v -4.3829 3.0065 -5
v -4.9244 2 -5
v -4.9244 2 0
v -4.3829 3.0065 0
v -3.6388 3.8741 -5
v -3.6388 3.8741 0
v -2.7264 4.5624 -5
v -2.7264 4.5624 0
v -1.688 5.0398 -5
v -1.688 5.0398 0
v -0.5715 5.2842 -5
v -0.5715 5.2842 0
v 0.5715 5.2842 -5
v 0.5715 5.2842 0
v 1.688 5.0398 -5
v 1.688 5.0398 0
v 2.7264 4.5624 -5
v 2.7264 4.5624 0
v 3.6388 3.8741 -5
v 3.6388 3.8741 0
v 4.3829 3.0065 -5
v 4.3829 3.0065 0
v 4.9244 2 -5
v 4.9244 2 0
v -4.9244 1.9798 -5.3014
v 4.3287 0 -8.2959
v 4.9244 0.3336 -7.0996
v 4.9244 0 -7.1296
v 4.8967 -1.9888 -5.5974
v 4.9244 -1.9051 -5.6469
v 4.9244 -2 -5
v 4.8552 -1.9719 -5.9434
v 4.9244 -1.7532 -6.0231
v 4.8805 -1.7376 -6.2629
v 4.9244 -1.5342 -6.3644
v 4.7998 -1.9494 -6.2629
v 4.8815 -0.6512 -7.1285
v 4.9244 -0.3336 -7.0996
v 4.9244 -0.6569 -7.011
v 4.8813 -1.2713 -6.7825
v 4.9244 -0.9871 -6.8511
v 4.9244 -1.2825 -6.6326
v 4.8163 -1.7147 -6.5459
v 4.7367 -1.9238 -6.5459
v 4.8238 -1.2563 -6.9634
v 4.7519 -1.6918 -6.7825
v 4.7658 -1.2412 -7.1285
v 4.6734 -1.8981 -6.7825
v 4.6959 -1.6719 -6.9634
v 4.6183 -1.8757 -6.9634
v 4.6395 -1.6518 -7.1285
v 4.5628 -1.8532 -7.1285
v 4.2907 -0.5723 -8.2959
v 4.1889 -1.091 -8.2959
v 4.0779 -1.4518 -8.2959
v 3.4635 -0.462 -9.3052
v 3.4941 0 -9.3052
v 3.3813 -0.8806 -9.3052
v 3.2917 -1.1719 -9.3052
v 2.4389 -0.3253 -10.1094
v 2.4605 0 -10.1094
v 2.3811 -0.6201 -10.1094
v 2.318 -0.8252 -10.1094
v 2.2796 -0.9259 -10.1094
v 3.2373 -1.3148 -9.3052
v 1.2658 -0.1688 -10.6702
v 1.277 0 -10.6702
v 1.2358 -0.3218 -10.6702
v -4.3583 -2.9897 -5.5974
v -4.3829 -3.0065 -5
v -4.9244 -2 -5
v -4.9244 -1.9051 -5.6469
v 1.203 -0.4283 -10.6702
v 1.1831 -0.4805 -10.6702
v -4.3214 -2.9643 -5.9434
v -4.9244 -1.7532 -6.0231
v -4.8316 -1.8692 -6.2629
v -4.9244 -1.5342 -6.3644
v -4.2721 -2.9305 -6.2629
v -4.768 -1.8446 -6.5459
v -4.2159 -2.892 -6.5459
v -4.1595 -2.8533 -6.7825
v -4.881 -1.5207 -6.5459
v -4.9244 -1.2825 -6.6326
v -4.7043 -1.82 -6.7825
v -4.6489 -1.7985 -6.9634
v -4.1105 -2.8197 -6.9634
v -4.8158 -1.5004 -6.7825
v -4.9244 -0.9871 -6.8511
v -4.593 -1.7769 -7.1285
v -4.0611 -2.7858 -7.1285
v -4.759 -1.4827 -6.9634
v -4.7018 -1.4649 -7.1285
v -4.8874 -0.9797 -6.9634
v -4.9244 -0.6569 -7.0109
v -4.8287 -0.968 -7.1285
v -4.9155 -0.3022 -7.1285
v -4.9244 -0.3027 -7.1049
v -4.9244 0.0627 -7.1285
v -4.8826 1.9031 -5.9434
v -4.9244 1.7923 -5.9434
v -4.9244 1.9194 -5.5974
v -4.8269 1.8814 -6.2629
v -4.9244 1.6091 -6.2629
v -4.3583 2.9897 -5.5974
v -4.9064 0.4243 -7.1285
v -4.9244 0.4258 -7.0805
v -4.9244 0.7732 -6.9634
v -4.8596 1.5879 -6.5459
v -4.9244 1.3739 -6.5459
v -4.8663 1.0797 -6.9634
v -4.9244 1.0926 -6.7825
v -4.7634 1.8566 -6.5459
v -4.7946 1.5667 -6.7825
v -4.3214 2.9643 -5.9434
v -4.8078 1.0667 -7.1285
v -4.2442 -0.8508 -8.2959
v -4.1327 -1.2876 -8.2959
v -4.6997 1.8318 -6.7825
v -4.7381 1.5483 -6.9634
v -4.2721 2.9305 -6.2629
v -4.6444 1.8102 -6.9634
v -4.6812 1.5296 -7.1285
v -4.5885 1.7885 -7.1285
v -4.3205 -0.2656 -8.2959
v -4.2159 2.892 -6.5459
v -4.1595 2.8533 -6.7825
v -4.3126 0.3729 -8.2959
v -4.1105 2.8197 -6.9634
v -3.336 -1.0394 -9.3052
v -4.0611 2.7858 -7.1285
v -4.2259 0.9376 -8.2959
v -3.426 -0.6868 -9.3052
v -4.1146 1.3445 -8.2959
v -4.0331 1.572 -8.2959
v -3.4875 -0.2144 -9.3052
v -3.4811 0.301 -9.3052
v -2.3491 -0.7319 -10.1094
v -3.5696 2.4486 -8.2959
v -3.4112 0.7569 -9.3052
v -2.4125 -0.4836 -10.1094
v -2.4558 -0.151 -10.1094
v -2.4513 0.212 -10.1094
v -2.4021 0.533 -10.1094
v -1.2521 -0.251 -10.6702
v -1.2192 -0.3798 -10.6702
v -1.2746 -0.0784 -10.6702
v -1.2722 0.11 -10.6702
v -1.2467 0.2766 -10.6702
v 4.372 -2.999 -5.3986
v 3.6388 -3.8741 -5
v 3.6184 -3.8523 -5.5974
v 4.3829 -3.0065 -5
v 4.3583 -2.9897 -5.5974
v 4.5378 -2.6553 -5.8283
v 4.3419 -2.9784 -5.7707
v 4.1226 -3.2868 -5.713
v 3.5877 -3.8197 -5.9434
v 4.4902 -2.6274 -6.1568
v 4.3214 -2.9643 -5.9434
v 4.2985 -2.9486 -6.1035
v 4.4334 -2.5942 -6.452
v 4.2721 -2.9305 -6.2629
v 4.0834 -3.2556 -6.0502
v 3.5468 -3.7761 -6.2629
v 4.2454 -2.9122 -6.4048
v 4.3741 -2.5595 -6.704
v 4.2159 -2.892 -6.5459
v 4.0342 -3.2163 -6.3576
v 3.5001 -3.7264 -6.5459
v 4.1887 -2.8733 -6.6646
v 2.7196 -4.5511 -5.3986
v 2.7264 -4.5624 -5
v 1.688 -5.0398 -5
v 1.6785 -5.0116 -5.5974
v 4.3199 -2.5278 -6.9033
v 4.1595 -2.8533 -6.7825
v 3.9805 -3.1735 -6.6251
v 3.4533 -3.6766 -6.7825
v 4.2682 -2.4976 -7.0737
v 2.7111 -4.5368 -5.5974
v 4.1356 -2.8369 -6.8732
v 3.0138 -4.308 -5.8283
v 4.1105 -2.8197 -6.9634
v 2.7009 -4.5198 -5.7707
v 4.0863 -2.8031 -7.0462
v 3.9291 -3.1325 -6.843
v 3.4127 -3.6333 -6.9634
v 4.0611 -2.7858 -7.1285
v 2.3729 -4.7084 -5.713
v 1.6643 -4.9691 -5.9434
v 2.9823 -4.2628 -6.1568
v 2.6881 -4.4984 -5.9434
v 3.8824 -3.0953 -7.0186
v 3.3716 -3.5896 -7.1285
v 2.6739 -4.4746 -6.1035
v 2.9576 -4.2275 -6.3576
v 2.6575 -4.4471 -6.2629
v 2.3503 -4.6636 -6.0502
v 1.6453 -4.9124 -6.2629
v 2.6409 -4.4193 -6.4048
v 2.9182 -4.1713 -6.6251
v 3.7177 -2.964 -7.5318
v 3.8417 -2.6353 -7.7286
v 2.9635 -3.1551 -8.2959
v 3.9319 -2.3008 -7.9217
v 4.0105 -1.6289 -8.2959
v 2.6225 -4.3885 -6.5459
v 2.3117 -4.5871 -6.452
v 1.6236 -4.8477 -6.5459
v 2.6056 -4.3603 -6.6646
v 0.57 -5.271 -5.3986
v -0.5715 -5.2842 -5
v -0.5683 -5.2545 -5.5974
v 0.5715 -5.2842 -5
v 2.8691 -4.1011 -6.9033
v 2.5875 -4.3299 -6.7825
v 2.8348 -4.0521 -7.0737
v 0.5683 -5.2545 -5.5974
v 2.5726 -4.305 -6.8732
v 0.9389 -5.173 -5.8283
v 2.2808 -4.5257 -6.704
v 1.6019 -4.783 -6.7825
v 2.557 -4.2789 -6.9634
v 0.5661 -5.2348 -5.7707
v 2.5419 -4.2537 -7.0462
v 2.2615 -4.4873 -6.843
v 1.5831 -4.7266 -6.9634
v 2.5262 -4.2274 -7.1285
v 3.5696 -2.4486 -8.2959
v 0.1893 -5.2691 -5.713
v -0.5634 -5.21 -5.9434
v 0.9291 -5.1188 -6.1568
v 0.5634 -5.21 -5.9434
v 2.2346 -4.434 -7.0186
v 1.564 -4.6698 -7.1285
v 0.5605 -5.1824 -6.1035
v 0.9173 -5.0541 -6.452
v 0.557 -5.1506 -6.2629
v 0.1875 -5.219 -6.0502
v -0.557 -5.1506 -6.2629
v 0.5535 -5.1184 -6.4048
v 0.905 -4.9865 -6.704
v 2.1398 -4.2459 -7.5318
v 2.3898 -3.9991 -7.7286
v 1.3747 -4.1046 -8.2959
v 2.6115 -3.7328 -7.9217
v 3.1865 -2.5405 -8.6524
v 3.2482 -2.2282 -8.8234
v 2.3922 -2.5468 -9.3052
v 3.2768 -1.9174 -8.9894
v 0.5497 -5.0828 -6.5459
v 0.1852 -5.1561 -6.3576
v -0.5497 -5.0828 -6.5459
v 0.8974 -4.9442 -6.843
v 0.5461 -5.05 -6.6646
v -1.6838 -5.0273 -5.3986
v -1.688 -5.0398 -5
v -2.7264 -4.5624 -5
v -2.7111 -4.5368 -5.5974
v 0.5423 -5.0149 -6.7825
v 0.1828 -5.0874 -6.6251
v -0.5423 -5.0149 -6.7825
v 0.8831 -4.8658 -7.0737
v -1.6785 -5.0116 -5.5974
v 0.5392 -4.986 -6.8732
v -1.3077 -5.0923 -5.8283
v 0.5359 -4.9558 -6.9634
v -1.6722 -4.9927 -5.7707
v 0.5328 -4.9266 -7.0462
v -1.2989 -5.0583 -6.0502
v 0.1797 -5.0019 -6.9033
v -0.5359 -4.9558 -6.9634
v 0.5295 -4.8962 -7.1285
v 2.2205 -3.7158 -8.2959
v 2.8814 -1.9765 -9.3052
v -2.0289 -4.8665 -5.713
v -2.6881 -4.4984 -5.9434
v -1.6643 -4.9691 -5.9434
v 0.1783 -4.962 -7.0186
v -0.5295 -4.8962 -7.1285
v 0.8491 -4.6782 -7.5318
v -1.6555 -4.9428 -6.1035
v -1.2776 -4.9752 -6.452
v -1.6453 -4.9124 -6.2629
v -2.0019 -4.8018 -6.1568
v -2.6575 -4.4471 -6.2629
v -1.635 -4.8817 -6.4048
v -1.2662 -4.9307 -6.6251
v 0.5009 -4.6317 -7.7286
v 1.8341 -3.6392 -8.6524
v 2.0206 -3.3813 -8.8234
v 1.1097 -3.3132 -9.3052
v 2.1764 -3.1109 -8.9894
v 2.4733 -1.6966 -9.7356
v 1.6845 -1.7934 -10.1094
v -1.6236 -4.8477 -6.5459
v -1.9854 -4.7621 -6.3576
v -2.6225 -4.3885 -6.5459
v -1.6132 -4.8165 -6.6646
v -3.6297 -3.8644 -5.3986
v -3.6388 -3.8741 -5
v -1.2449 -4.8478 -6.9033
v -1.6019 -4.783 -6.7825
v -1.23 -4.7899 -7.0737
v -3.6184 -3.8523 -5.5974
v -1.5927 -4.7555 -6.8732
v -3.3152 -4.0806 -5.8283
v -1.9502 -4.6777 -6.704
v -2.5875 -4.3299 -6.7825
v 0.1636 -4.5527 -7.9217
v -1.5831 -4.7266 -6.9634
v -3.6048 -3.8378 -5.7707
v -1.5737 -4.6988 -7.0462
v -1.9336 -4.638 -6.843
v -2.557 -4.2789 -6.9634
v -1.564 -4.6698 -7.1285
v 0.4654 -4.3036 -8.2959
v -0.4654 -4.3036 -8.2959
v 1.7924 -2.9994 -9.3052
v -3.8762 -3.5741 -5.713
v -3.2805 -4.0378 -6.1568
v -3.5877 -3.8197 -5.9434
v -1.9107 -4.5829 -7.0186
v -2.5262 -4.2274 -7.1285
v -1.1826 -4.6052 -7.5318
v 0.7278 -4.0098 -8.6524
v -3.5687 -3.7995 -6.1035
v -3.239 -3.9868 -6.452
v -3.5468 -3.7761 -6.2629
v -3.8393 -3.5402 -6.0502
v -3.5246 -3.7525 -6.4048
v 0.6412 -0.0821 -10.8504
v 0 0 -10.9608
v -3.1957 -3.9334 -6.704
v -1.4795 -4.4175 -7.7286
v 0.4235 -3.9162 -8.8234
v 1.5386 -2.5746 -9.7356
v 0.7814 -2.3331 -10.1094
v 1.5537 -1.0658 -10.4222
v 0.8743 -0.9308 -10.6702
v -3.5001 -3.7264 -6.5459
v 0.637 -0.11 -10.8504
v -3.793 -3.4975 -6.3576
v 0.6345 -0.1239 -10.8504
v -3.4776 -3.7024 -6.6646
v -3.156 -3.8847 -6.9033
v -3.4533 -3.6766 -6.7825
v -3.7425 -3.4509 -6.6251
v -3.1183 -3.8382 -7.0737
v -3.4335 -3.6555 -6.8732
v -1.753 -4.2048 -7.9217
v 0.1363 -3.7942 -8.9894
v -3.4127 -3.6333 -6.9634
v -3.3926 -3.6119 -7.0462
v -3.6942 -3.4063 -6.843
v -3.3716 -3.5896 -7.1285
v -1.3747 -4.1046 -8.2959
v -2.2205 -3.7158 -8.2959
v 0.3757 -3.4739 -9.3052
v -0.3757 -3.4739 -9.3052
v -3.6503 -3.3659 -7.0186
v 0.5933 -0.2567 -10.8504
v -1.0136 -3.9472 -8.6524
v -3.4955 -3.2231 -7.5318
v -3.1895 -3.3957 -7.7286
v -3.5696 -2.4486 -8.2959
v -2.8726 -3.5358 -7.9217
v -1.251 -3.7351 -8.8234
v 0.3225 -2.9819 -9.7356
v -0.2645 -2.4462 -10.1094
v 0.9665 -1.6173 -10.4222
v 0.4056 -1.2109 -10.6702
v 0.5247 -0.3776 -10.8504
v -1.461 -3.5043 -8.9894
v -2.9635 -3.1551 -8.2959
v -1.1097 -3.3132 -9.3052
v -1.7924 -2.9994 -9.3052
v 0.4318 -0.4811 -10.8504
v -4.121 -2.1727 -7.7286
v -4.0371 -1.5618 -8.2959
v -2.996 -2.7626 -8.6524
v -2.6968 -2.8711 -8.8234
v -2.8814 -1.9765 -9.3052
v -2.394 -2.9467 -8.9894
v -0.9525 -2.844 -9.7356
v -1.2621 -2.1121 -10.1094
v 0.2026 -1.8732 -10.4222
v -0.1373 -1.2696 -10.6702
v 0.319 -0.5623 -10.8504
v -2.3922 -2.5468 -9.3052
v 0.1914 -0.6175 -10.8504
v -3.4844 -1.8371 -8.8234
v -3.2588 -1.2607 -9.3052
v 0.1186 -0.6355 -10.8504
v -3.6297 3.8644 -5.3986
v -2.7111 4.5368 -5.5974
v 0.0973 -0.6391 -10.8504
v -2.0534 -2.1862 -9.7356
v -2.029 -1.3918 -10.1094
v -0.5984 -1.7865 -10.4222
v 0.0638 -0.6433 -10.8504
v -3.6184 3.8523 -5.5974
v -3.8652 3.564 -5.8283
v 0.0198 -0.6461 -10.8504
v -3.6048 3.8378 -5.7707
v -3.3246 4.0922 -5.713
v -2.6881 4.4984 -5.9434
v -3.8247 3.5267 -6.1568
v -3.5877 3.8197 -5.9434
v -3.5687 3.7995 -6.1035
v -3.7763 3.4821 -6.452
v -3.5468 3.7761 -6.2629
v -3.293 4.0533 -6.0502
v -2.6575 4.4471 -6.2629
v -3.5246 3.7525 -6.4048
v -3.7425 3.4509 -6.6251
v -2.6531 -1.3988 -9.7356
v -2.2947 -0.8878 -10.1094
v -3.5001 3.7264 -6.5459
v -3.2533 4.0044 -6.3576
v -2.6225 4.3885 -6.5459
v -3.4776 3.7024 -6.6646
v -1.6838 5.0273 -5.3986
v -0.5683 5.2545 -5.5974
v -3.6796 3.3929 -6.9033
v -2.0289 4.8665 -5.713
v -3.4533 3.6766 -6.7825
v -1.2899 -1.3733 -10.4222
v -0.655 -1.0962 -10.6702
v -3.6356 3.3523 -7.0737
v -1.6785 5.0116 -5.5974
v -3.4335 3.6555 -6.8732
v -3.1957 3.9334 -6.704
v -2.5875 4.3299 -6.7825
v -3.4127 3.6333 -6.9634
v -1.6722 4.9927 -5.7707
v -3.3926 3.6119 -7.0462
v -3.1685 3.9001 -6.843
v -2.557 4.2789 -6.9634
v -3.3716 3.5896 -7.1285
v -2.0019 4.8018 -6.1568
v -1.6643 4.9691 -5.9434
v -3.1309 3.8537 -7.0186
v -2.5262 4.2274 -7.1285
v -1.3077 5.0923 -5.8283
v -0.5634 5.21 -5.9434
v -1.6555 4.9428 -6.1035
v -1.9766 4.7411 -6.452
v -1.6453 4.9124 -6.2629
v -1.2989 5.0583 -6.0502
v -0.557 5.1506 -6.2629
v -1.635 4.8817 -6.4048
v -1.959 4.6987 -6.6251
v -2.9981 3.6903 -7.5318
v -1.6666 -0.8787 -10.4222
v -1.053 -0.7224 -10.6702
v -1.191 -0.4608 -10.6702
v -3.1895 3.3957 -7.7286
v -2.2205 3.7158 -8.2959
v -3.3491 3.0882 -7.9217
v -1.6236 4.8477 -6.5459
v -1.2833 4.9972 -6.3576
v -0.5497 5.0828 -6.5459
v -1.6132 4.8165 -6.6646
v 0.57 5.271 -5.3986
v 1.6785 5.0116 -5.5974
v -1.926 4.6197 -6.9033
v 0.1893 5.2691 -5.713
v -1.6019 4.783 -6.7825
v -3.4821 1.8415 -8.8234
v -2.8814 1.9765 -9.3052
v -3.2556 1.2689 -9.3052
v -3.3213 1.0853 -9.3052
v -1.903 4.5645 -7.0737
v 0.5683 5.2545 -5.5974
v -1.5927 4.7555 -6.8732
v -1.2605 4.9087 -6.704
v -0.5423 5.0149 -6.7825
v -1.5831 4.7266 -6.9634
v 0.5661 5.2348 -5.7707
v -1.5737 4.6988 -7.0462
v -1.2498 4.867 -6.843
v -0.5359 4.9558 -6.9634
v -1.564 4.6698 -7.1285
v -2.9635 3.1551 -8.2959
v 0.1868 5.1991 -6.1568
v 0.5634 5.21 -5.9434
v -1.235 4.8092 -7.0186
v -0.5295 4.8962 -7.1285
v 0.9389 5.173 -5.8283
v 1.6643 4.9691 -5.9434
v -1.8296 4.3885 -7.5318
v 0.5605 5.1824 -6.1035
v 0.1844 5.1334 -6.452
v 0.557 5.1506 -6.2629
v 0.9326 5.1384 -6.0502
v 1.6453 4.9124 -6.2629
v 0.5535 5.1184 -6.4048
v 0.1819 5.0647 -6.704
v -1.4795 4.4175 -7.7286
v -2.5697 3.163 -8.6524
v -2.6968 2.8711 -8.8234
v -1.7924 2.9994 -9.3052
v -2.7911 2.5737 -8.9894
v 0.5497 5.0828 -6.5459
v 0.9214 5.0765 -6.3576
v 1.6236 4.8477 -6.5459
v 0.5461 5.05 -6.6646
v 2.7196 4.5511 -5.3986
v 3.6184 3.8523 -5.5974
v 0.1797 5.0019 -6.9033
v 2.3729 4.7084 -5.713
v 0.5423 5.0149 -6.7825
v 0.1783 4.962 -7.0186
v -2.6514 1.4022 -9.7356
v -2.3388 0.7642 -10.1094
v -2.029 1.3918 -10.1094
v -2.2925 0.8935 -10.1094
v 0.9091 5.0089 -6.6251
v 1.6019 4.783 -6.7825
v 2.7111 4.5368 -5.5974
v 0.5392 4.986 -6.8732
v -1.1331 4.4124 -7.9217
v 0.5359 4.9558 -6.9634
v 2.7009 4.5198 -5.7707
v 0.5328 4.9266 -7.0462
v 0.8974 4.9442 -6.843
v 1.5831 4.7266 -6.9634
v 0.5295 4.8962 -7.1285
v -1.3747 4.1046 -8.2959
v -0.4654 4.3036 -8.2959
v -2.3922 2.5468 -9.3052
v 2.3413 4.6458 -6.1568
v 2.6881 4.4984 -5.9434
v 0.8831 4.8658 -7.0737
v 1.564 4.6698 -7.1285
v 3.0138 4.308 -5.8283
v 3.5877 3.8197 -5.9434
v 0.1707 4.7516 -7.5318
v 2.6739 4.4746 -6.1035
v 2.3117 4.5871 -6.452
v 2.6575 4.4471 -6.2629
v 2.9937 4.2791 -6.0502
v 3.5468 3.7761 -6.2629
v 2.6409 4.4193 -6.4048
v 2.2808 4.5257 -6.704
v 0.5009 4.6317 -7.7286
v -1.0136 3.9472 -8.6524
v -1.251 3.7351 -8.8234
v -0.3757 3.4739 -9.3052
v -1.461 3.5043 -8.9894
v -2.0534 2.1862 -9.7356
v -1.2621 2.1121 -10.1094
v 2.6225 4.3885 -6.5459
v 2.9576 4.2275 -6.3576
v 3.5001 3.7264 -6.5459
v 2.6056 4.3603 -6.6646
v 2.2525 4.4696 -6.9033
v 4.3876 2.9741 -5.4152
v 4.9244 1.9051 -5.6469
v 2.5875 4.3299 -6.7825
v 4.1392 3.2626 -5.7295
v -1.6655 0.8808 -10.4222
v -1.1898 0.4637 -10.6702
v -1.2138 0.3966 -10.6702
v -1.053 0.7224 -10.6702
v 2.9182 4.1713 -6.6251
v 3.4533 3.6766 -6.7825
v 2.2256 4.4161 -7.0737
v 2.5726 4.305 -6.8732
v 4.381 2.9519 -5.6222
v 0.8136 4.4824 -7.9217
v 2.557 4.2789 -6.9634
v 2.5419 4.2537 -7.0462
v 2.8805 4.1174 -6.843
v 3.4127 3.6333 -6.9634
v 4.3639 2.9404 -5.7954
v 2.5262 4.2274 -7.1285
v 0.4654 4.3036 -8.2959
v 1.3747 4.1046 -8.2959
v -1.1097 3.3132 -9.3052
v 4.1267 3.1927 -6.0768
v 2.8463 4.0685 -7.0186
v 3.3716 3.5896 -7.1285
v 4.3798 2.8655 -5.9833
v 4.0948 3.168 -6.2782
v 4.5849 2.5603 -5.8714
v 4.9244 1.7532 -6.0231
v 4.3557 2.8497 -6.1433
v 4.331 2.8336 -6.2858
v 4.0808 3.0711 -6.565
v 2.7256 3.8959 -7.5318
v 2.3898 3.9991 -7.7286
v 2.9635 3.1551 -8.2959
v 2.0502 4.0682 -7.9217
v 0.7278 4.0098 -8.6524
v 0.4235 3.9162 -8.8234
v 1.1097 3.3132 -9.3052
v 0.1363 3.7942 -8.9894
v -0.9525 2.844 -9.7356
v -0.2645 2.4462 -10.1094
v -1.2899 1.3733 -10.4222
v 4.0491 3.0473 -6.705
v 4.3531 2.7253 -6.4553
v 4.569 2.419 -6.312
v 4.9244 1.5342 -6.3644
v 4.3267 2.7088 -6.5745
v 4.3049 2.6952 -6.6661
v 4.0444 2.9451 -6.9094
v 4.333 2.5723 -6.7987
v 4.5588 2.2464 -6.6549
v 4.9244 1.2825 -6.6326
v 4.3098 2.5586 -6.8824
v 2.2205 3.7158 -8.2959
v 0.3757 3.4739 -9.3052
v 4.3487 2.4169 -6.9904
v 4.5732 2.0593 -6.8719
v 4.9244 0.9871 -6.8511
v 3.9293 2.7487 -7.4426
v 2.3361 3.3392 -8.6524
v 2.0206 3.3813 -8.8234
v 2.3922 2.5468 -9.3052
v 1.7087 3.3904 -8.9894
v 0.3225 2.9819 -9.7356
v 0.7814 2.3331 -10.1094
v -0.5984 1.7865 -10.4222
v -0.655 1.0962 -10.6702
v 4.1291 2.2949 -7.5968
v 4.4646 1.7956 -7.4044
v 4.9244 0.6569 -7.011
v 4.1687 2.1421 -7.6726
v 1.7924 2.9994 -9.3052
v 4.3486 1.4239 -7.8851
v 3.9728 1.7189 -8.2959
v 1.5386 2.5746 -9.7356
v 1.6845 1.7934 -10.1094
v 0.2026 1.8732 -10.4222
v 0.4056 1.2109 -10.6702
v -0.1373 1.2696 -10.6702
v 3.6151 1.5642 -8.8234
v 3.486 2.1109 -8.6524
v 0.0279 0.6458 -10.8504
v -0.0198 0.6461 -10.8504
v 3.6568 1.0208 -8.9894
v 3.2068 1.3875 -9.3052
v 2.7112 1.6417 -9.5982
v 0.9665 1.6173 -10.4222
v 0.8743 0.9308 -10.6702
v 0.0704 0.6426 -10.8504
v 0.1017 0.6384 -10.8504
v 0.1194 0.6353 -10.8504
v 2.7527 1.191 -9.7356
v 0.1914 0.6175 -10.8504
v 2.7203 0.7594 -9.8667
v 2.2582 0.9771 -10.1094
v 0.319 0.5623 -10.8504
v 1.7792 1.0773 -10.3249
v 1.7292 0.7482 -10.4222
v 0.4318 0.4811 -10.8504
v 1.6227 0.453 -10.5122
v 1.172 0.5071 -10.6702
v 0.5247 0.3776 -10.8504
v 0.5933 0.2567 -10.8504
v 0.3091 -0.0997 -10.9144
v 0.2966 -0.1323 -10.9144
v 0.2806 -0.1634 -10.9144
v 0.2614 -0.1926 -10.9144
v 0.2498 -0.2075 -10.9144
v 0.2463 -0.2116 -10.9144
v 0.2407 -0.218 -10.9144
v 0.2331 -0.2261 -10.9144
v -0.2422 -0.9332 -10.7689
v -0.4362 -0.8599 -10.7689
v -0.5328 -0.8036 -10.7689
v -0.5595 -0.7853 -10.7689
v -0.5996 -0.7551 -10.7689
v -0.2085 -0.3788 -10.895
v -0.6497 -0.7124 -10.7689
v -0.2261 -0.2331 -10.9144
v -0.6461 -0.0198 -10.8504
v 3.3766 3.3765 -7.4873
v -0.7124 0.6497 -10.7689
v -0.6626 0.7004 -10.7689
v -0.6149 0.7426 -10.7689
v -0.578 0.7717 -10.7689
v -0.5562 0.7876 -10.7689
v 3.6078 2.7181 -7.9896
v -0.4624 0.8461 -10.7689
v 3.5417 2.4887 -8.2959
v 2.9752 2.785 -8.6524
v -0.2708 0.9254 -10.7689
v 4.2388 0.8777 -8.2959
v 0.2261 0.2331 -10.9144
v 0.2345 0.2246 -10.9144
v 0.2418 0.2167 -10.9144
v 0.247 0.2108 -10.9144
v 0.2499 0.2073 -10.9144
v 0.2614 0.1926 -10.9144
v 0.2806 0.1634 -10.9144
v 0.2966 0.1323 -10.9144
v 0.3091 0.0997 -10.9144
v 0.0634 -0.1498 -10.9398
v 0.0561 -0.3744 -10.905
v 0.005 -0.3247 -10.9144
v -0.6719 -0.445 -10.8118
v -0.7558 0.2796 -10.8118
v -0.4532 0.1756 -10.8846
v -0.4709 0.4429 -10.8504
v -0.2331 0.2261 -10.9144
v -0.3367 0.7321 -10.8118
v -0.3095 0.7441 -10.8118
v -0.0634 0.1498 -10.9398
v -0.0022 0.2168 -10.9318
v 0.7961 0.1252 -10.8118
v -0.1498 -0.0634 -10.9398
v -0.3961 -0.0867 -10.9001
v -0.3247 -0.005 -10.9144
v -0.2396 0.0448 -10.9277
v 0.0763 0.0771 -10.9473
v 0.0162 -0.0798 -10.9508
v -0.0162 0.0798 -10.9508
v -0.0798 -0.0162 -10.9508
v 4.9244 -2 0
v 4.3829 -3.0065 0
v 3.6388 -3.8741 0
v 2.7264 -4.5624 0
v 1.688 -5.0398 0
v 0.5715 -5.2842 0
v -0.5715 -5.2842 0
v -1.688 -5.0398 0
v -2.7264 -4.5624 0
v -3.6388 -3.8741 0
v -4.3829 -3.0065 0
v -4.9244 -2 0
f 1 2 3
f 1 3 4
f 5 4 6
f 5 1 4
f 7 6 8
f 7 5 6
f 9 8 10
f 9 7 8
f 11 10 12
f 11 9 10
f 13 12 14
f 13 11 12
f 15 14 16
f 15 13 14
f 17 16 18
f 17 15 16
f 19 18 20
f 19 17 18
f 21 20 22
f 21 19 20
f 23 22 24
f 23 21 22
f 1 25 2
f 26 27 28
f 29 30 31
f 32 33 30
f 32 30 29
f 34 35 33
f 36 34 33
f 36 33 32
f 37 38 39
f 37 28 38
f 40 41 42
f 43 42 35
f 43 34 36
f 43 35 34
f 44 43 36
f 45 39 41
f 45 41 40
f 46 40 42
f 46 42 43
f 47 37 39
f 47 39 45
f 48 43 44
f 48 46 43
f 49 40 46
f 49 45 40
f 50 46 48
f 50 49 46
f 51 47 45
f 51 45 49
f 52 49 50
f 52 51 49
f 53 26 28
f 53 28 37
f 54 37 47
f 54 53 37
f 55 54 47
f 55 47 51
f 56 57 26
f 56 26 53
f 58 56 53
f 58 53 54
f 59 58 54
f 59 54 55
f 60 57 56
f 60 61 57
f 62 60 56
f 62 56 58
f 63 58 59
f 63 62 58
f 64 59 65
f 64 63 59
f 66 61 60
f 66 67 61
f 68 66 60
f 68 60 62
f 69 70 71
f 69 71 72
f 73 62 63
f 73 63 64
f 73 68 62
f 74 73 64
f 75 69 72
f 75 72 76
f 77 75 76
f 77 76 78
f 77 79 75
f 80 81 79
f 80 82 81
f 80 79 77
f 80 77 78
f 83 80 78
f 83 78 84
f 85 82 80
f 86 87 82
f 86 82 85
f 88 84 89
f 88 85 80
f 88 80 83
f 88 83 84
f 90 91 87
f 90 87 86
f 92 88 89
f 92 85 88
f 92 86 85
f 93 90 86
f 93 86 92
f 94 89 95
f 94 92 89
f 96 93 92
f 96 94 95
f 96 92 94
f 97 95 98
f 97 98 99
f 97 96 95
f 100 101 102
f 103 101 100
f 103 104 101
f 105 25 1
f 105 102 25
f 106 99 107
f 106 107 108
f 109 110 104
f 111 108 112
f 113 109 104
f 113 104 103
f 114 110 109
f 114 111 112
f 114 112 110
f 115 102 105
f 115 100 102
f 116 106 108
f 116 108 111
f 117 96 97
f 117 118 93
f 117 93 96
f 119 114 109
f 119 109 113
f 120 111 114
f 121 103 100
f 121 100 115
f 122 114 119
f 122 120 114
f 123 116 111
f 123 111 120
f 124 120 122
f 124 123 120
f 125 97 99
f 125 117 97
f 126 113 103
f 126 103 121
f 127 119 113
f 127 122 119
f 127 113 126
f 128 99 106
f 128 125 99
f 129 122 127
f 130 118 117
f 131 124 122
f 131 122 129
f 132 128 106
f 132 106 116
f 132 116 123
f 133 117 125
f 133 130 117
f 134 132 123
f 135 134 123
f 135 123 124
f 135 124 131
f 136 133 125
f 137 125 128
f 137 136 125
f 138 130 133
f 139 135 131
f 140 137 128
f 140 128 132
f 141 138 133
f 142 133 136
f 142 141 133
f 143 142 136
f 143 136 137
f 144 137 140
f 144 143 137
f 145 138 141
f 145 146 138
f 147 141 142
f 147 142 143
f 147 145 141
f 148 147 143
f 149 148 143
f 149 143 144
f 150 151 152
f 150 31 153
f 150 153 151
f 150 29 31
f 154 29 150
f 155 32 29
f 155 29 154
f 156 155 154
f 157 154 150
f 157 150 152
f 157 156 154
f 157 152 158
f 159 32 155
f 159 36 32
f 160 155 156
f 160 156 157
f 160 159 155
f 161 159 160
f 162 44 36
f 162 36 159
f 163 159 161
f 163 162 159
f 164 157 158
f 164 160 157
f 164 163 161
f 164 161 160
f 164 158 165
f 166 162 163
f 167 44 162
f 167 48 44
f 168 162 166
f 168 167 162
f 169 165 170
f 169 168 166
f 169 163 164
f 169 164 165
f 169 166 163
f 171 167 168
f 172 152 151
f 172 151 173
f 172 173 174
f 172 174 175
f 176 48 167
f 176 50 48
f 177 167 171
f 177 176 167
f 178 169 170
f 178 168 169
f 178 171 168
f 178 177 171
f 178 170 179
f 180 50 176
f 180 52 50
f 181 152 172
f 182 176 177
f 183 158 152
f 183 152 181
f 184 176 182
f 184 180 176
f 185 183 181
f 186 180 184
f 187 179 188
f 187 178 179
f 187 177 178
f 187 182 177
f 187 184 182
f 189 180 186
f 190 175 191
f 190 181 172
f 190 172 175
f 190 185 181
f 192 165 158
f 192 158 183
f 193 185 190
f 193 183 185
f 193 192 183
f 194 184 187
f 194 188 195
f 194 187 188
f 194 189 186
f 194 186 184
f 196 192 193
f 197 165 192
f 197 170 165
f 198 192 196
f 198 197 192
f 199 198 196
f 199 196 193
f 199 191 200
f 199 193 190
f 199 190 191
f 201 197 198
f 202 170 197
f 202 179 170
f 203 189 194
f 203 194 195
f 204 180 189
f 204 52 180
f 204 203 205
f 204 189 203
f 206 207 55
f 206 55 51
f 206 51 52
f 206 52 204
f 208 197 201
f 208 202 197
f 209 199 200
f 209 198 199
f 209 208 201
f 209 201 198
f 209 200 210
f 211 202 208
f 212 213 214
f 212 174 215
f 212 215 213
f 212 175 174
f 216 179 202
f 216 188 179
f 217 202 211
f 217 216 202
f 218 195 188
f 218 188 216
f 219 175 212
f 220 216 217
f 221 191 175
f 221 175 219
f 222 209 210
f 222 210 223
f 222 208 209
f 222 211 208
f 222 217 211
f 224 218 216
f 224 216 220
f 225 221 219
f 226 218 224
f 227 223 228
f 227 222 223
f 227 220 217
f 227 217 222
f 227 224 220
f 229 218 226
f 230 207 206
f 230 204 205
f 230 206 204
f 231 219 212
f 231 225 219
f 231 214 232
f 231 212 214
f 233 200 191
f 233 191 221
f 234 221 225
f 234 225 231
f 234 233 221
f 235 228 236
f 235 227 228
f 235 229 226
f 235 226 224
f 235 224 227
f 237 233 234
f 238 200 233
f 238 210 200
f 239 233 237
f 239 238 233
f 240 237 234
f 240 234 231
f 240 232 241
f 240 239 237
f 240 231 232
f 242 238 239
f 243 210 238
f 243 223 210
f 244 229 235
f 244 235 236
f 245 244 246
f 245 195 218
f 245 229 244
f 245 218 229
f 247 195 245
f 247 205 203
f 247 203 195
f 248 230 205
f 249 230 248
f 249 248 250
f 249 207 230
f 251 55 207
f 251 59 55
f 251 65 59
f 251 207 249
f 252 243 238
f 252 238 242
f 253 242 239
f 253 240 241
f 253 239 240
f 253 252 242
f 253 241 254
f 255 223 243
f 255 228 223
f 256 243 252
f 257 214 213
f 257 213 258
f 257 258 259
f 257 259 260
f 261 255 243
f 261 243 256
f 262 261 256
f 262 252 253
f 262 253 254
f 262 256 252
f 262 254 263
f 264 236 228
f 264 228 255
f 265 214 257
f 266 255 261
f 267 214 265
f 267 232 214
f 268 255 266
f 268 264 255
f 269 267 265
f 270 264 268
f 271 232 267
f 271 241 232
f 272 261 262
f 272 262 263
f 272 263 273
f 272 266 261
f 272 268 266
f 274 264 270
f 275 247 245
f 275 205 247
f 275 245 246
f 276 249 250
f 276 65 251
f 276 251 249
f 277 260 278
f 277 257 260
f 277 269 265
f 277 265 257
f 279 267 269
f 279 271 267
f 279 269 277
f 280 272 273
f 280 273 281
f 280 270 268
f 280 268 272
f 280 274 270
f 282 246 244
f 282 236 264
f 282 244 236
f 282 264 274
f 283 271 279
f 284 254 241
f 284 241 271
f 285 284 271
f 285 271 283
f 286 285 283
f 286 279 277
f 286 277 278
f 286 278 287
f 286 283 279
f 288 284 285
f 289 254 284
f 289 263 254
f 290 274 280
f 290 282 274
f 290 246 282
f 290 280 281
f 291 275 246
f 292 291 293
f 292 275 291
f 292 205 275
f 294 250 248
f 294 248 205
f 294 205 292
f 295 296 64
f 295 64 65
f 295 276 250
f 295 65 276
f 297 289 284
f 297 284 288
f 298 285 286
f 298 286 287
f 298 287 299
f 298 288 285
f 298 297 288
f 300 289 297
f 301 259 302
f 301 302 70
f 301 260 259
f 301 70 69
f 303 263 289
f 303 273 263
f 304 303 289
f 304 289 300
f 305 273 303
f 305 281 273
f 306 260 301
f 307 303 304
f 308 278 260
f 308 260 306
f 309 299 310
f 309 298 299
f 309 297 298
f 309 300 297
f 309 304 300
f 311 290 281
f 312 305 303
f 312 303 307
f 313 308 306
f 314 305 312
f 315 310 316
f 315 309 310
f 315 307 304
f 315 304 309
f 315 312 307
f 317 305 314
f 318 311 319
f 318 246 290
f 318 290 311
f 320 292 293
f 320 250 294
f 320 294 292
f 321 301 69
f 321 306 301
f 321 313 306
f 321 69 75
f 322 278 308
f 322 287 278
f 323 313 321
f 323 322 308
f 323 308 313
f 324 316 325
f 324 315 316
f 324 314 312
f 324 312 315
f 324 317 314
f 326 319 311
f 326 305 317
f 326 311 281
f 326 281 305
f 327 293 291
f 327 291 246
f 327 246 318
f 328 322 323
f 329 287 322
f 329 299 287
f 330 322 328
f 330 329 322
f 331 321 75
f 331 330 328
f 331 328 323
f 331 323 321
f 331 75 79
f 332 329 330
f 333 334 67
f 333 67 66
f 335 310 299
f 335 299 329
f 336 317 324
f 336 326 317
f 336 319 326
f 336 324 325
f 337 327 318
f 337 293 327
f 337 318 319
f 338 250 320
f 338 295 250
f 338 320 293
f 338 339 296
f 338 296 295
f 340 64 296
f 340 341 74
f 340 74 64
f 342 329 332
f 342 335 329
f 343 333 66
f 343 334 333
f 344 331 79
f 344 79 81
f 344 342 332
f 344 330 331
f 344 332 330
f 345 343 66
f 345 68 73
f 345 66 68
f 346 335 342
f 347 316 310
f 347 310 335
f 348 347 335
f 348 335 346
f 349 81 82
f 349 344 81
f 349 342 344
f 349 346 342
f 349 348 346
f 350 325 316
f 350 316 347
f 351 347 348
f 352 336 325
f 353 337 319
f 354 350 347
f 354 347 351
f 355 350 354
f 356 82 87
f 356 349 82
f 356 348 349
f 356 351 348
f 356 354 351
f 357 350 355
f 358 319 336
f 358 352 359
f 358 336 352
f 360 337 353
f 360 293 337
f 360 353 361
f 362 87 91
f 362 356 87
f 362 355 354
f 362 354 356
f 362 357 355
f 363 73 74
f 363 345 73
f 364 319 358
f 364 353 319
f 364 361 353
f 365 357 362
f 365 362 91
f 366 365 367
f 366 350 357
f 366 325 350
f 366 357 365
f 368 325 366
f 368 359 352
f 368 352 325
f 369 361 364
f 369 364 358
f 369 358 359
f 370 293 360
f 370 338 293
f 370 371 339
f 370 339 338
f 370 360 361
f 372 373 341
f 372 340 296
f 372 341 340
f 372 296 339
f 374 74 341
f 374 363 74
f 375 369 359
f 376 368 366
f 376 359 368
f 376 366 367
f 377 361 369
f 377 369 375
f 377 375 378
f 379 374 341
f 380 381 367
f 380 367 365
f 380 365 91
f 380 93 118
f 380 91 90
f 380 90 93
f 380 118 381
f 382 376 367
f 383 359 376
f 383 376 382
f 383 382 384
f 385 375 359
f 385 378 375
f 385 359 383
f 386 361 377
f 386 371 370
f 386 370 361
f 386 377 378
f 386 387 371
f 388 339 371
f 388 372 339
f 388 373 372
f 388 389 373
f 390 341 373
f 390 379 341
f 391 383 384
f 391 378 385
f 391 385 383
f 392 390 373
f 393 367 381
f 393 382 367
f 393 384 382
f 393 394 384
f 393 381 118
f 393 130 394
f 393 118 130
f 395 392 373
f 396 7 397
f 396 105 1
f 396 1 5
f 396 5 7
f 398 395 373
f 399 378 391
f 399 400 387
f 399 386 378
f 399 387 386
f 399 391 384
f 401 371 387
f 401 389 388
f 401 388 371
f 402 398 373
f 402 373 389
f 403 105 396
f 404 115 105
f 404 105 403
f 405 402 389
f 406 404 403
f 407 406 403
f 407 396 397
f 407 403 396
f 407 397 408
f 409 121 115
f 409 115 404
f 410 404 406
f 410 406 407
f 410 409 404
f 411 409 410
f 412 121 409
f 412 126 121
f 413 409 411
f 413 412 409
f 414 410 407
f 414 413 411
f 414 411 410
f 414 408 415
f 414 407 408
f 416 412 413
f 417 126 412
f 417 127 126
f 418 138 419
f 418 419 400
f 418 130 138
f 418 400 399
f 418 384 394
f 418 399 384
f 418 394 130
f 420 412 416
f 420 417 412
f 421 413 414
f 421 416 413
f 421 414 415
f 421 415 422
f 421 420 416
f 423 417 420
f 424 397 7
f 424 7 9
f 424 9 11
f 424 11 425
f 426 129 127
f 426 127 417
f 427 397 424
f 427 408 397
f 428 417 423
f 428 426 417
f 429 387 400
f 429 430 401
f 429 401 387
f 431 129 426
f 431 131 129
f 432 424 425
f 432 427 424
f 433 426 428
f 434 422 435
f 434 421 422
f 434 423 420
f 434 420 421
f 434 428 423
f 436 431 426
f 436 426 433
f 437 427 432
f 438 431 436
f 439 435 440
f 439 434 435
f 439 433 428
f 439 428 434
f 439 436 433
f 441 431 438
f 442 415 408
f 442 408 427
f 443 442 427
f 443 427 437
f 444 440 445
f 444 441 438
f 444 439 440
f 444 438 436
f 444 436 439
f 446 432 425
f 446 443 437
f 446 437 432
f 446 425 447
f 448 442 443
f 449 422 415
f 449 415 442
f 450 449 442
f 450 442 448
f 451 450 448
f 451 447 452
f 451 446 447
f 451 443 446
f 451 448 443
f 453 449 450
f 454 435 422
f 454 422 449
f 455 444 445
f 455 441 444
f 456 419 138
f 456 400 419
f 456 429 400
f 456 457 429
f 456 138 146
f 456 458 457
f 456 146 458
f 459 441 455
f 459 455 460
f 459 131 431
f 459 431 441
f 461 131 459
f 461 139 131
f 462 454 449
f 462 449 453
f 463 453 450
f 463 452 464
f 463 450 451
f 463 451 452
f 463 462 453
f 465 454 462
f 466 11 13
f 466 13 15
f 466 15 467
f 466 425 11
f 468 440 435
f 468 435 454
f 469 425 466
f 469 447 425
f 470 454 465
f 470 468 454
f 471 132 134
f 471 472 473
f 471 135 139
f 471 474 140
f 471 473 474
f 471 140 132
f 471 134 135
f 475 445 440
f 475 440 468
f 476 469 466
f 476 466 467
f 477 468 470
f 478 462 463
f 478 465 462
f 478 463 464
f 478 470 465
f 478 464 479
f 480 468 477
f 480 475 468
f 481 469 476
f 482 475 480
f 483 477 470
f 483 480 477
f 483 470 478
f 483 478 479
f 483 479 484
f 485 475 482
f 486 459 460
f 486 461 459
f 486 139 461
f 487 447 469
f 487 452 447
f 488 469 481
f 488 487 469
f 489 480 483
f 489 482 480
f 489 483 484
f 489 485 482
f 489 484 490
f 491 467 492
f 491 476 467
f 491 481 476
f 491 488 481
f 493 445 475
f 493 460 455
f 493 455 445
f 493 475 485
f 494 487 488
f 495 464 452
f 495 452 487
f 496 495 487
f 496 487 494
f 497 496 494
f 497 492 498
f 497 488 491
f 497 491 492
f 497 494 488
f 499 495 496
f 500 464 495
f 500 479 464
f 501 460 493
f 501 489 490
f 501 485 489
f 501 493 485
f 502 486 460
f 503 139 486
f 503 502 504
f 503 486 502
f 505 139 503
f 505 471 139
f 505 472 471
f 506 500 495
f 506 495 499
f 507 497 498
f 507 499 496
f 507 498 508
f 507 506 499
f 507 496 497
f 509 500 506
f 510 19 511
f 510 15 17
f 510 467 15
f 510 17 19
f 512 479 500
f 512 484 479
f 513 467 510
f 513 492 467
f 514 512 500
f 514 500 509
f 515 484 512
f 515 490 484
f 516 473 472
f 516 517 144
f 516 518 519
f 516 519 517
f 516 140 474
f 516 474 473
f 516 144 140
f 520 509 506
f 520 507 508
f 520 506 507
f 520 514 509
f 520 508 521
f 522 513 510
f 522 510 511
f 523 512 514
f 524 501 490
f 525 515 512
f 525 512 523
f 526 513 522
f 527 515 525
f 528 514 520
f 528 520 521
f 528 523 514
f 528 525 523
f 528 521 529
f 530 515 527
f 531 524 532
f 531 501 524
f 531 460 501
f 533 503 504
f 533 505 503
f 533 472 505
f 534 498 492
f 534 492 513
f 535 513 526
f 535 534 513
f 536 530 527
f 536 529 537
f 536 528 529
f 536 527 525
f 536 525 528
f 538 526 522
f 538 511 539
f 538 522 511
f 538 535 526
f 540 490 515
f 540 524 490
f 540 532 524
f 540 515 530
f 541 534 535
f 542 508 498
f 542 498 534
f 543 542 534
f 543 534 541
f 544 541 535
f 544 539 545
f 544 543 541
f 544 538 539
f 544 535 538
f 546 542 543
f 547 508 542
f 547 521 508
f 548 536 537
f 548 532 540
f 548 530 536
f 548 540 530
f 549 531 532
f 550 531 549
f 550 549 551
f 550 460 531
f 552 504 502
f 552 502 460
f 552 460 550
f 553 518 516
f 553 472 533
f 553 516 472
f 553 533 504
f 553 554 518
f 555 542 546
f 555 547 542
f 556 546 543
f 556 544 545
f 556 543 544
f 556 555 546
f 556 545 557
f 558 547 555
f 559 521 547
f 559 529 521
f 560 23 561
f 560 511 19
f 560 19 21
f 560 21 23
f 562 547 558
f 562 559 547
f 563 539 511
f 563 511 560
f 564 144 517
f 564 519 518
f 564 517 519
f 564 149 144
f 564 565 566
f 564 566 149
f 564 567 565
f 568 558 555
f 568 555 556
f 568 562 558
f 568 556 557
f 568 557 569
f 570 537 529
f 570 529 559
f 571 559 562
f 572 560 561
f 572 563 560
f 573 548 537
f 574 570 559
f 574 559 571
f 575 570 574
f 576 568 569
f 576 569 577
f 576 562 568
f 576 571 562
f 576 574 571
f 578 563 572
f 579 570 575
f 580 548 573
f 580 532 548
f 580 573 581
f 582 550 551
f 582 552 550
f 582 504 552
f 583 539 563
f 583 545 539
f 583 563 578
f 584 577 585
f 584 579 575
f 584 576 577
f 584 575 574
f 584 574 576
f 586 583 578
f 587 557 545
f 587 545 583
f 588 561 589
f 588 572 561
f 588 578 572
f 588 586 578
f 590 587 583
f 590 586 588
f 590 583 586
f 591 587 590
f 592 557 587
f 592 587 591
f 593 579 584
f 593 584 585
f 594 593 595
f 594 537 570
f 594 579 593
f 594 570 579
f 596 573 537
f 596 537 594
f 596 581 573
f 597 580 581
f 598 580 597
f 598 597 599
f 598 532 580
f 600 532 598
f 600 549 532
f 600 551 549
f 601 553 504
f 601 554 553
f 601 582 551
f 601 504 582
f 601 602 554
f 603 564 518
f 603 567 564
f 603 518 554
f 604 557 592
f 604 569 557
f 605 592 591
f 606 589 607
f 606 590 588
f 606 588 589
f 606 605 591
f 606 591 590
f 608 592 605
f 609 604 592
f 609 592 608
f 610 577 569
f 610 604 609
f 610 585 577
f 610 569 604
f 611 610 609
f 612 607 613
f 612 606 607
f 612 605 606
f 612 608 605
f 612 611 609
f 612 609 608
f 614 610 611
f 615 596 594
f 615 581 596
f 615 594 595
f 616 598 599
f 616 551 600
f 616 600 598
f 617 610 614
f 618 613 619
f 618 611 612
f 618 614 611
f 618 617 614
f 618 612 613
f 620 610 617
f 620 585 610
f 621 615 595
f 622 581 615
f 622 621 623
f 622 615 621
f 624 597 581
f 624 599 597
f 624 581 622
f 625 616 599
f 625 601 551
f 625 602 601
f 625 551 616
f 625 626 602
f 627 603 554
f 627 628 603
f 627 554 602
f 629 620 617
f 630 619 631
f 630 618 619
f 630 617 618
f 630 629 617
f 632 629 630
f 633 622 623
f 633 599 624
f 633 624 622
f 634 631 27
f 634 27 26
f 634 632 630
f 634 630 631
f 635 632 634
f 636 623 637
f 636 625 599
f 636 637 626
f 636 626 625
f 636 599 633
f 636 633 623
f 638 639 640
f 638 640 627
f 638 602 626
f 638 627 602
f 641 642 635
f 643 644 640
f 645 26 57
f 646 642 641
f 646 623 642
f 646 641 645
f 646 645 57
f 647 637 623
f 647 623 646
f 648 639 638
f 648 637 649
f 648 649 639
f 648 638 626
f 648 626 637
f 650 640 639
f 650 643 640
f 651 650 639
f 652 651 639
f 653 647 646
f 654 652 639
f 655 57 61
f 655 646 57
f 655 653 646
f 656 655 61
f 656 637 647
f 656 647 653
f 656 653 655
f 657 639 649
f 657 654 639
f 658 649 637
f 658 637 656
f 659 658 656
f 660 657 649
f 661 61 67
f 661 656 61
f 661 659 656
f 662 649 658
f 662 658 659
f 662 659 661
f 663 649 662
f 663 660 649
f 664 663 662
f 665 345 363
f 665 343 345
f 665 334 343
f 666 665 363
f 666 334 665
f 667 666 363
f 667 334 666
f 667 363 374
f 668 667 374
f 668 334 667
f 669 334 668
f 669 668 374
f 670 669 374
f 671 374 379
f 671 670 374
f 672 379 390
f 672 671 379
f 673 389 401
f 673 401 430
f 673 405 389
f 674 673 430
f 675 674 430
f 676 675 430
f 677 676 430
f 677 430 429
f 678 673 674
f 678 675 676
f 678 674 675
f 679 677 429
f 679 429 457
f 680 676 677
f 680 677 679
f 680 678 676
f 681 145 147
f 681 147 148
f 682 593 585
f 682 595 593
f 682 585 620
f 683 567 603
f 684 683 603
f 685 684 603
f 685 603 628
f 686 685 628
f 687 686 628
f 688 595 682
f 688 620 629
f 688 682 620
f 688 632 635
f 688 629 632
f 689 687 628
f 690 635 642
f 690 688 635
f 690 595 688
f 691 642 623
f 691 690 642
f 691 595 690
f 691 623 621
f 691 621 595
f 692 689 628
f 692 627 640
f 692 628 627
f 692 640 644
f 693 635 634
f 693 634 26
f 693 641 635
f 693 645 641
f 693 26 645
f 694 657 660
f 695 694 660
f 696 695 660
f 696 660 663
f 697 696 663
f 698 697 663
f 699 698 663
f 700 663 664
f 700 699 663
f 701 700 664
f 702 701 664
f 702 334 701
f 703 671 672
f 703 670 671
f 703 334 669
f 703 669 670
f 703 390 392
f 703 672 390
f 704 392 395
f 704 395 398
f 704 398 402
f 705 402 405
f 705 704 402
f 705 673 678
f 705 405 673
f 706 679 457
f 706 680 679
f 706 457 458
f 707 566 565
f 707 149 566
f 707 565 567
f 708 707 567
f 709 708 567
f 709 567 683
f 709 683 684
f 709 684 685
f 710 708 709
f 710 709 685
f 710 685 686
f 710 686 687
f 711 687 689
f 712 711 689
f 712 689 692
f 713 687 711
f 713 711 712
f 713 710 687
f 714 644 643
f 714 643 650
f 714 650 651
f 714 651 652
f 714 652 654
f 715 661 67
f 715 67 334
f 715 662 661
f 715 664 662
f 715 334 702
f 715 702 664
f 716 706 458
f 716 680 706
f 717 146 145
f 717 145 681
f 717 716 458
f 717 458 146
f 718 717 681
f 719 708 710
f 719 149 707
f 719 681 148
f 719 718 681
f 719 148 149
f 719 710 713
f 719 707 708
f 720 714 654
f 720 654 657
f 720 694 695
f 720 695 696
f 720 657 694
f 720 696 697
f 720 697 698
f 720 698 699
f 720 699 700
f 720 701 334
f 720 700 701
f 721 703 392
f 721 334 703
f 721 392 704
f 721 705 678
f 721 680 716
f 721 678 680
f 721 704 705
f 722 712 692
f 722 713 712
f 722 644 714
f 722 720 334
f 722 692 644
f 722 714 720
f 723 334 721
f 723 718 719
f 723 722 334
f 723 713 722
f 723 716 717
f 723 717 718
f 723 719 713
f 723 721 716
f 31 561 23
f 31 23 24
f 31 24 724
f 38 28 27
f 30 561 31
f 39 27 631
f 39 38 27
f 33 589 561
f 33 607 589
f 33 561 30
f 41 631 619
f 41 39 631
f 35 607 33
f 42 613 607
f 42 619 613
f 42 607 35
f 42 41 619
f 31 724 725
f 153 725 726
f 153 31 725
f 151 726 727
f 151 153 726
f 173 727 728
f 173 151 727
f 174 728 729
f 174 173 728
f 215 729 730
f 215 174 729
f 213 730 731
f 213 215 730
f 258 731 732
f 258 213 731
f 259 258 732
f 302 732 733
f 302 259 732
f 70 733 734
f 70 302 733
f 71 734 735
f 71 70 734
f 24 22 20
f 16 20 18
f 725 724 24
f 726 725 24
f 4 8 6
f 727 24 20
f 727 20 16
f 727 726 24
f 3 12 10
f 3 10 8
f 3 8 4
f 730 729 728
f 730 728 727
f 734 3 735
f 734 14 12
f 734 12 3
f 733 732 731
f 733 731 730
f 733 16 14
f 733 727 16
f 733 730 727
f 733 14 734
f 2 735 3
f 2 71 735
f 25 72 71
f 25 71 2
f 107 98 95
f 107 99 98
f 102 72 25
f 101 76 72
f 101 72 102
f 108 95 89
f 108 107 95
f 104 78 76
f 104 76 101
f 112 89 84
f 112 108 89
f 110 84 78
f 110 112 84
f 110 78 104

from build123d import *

# Parameters (mm, degrees)
CUT_EXTRUDE2_DEPTH      = 14.290482533
CUT_EXTRUDE2_DEPTH_BACK = 14.290482533
CUT_EXTRUDE4_DEPTH      = 14.290482533
CUT_EXTRUDE4_DEPTH_BACK = 14.290482533


with BuildPart() as part:
    # Sketch1 → Revolve2 (revolve)
    with BuildSketch(Plane(origin=(0, 0, 0), x_dir=(1, 0, 0), z_dir=(0, 1, 0))):
        with BuildLine():
            Line((0, 0), (5.315, 0))
            Line((5.315, 0), (5.315, 5))
            ThreePointArc((5.315, 5), (3.79328092, 8.993119082), (0, 10.960769665))
            Line((0, 10.960769665), (0, 0))
        make_face()
    revolve(axis=Axis((0, 0, 0), (0, 0, -1)))

    # Sketch3 → Cut-Extrude2 (cut, two sides: drawn at the far end of the back side and taken through both)
    with BuildSketch(Plane.XY.offset(-CUT_EXTRUDE2_DEPTH_BACK)):
        Polygon((-4.924350211, -37.167719106), (-4.924350211, -2), (-4.924350211, 2), (-4.924350211, 37.167719106), (-75.259788424, 37.167719106), (-75.259788424, -37.167719106), align=None)
    extrude(amount=CUT_EXTRUDE2_DEPTH + CUT_EXTRUDE2_DEPTH_BACK, mode=Mode.SUBTRACT)

    # Sketch4 → Cut-Extrude4 (cut, two sides: drawn at the far end of the back side and taken through both)
    with BuildSketch(Plane.XY.offset(-CUT_EXTRUDE4_DEPTH_BACK)):
        Polygon((4.924350211, -37.167719106), (4.924350211, -2), (4.924350211, 2), (4.924350211, 37.167719106), (75.259788424, 37.167719106), (75.259788424, -37.167719106), align=None)
    extrude(amount=CUT_EXTRUDE4_DEPTH + CUT_EXTRUDE4_DEPTH_BACK, mode=Mode.SUBTRACT)


solid = part.part
